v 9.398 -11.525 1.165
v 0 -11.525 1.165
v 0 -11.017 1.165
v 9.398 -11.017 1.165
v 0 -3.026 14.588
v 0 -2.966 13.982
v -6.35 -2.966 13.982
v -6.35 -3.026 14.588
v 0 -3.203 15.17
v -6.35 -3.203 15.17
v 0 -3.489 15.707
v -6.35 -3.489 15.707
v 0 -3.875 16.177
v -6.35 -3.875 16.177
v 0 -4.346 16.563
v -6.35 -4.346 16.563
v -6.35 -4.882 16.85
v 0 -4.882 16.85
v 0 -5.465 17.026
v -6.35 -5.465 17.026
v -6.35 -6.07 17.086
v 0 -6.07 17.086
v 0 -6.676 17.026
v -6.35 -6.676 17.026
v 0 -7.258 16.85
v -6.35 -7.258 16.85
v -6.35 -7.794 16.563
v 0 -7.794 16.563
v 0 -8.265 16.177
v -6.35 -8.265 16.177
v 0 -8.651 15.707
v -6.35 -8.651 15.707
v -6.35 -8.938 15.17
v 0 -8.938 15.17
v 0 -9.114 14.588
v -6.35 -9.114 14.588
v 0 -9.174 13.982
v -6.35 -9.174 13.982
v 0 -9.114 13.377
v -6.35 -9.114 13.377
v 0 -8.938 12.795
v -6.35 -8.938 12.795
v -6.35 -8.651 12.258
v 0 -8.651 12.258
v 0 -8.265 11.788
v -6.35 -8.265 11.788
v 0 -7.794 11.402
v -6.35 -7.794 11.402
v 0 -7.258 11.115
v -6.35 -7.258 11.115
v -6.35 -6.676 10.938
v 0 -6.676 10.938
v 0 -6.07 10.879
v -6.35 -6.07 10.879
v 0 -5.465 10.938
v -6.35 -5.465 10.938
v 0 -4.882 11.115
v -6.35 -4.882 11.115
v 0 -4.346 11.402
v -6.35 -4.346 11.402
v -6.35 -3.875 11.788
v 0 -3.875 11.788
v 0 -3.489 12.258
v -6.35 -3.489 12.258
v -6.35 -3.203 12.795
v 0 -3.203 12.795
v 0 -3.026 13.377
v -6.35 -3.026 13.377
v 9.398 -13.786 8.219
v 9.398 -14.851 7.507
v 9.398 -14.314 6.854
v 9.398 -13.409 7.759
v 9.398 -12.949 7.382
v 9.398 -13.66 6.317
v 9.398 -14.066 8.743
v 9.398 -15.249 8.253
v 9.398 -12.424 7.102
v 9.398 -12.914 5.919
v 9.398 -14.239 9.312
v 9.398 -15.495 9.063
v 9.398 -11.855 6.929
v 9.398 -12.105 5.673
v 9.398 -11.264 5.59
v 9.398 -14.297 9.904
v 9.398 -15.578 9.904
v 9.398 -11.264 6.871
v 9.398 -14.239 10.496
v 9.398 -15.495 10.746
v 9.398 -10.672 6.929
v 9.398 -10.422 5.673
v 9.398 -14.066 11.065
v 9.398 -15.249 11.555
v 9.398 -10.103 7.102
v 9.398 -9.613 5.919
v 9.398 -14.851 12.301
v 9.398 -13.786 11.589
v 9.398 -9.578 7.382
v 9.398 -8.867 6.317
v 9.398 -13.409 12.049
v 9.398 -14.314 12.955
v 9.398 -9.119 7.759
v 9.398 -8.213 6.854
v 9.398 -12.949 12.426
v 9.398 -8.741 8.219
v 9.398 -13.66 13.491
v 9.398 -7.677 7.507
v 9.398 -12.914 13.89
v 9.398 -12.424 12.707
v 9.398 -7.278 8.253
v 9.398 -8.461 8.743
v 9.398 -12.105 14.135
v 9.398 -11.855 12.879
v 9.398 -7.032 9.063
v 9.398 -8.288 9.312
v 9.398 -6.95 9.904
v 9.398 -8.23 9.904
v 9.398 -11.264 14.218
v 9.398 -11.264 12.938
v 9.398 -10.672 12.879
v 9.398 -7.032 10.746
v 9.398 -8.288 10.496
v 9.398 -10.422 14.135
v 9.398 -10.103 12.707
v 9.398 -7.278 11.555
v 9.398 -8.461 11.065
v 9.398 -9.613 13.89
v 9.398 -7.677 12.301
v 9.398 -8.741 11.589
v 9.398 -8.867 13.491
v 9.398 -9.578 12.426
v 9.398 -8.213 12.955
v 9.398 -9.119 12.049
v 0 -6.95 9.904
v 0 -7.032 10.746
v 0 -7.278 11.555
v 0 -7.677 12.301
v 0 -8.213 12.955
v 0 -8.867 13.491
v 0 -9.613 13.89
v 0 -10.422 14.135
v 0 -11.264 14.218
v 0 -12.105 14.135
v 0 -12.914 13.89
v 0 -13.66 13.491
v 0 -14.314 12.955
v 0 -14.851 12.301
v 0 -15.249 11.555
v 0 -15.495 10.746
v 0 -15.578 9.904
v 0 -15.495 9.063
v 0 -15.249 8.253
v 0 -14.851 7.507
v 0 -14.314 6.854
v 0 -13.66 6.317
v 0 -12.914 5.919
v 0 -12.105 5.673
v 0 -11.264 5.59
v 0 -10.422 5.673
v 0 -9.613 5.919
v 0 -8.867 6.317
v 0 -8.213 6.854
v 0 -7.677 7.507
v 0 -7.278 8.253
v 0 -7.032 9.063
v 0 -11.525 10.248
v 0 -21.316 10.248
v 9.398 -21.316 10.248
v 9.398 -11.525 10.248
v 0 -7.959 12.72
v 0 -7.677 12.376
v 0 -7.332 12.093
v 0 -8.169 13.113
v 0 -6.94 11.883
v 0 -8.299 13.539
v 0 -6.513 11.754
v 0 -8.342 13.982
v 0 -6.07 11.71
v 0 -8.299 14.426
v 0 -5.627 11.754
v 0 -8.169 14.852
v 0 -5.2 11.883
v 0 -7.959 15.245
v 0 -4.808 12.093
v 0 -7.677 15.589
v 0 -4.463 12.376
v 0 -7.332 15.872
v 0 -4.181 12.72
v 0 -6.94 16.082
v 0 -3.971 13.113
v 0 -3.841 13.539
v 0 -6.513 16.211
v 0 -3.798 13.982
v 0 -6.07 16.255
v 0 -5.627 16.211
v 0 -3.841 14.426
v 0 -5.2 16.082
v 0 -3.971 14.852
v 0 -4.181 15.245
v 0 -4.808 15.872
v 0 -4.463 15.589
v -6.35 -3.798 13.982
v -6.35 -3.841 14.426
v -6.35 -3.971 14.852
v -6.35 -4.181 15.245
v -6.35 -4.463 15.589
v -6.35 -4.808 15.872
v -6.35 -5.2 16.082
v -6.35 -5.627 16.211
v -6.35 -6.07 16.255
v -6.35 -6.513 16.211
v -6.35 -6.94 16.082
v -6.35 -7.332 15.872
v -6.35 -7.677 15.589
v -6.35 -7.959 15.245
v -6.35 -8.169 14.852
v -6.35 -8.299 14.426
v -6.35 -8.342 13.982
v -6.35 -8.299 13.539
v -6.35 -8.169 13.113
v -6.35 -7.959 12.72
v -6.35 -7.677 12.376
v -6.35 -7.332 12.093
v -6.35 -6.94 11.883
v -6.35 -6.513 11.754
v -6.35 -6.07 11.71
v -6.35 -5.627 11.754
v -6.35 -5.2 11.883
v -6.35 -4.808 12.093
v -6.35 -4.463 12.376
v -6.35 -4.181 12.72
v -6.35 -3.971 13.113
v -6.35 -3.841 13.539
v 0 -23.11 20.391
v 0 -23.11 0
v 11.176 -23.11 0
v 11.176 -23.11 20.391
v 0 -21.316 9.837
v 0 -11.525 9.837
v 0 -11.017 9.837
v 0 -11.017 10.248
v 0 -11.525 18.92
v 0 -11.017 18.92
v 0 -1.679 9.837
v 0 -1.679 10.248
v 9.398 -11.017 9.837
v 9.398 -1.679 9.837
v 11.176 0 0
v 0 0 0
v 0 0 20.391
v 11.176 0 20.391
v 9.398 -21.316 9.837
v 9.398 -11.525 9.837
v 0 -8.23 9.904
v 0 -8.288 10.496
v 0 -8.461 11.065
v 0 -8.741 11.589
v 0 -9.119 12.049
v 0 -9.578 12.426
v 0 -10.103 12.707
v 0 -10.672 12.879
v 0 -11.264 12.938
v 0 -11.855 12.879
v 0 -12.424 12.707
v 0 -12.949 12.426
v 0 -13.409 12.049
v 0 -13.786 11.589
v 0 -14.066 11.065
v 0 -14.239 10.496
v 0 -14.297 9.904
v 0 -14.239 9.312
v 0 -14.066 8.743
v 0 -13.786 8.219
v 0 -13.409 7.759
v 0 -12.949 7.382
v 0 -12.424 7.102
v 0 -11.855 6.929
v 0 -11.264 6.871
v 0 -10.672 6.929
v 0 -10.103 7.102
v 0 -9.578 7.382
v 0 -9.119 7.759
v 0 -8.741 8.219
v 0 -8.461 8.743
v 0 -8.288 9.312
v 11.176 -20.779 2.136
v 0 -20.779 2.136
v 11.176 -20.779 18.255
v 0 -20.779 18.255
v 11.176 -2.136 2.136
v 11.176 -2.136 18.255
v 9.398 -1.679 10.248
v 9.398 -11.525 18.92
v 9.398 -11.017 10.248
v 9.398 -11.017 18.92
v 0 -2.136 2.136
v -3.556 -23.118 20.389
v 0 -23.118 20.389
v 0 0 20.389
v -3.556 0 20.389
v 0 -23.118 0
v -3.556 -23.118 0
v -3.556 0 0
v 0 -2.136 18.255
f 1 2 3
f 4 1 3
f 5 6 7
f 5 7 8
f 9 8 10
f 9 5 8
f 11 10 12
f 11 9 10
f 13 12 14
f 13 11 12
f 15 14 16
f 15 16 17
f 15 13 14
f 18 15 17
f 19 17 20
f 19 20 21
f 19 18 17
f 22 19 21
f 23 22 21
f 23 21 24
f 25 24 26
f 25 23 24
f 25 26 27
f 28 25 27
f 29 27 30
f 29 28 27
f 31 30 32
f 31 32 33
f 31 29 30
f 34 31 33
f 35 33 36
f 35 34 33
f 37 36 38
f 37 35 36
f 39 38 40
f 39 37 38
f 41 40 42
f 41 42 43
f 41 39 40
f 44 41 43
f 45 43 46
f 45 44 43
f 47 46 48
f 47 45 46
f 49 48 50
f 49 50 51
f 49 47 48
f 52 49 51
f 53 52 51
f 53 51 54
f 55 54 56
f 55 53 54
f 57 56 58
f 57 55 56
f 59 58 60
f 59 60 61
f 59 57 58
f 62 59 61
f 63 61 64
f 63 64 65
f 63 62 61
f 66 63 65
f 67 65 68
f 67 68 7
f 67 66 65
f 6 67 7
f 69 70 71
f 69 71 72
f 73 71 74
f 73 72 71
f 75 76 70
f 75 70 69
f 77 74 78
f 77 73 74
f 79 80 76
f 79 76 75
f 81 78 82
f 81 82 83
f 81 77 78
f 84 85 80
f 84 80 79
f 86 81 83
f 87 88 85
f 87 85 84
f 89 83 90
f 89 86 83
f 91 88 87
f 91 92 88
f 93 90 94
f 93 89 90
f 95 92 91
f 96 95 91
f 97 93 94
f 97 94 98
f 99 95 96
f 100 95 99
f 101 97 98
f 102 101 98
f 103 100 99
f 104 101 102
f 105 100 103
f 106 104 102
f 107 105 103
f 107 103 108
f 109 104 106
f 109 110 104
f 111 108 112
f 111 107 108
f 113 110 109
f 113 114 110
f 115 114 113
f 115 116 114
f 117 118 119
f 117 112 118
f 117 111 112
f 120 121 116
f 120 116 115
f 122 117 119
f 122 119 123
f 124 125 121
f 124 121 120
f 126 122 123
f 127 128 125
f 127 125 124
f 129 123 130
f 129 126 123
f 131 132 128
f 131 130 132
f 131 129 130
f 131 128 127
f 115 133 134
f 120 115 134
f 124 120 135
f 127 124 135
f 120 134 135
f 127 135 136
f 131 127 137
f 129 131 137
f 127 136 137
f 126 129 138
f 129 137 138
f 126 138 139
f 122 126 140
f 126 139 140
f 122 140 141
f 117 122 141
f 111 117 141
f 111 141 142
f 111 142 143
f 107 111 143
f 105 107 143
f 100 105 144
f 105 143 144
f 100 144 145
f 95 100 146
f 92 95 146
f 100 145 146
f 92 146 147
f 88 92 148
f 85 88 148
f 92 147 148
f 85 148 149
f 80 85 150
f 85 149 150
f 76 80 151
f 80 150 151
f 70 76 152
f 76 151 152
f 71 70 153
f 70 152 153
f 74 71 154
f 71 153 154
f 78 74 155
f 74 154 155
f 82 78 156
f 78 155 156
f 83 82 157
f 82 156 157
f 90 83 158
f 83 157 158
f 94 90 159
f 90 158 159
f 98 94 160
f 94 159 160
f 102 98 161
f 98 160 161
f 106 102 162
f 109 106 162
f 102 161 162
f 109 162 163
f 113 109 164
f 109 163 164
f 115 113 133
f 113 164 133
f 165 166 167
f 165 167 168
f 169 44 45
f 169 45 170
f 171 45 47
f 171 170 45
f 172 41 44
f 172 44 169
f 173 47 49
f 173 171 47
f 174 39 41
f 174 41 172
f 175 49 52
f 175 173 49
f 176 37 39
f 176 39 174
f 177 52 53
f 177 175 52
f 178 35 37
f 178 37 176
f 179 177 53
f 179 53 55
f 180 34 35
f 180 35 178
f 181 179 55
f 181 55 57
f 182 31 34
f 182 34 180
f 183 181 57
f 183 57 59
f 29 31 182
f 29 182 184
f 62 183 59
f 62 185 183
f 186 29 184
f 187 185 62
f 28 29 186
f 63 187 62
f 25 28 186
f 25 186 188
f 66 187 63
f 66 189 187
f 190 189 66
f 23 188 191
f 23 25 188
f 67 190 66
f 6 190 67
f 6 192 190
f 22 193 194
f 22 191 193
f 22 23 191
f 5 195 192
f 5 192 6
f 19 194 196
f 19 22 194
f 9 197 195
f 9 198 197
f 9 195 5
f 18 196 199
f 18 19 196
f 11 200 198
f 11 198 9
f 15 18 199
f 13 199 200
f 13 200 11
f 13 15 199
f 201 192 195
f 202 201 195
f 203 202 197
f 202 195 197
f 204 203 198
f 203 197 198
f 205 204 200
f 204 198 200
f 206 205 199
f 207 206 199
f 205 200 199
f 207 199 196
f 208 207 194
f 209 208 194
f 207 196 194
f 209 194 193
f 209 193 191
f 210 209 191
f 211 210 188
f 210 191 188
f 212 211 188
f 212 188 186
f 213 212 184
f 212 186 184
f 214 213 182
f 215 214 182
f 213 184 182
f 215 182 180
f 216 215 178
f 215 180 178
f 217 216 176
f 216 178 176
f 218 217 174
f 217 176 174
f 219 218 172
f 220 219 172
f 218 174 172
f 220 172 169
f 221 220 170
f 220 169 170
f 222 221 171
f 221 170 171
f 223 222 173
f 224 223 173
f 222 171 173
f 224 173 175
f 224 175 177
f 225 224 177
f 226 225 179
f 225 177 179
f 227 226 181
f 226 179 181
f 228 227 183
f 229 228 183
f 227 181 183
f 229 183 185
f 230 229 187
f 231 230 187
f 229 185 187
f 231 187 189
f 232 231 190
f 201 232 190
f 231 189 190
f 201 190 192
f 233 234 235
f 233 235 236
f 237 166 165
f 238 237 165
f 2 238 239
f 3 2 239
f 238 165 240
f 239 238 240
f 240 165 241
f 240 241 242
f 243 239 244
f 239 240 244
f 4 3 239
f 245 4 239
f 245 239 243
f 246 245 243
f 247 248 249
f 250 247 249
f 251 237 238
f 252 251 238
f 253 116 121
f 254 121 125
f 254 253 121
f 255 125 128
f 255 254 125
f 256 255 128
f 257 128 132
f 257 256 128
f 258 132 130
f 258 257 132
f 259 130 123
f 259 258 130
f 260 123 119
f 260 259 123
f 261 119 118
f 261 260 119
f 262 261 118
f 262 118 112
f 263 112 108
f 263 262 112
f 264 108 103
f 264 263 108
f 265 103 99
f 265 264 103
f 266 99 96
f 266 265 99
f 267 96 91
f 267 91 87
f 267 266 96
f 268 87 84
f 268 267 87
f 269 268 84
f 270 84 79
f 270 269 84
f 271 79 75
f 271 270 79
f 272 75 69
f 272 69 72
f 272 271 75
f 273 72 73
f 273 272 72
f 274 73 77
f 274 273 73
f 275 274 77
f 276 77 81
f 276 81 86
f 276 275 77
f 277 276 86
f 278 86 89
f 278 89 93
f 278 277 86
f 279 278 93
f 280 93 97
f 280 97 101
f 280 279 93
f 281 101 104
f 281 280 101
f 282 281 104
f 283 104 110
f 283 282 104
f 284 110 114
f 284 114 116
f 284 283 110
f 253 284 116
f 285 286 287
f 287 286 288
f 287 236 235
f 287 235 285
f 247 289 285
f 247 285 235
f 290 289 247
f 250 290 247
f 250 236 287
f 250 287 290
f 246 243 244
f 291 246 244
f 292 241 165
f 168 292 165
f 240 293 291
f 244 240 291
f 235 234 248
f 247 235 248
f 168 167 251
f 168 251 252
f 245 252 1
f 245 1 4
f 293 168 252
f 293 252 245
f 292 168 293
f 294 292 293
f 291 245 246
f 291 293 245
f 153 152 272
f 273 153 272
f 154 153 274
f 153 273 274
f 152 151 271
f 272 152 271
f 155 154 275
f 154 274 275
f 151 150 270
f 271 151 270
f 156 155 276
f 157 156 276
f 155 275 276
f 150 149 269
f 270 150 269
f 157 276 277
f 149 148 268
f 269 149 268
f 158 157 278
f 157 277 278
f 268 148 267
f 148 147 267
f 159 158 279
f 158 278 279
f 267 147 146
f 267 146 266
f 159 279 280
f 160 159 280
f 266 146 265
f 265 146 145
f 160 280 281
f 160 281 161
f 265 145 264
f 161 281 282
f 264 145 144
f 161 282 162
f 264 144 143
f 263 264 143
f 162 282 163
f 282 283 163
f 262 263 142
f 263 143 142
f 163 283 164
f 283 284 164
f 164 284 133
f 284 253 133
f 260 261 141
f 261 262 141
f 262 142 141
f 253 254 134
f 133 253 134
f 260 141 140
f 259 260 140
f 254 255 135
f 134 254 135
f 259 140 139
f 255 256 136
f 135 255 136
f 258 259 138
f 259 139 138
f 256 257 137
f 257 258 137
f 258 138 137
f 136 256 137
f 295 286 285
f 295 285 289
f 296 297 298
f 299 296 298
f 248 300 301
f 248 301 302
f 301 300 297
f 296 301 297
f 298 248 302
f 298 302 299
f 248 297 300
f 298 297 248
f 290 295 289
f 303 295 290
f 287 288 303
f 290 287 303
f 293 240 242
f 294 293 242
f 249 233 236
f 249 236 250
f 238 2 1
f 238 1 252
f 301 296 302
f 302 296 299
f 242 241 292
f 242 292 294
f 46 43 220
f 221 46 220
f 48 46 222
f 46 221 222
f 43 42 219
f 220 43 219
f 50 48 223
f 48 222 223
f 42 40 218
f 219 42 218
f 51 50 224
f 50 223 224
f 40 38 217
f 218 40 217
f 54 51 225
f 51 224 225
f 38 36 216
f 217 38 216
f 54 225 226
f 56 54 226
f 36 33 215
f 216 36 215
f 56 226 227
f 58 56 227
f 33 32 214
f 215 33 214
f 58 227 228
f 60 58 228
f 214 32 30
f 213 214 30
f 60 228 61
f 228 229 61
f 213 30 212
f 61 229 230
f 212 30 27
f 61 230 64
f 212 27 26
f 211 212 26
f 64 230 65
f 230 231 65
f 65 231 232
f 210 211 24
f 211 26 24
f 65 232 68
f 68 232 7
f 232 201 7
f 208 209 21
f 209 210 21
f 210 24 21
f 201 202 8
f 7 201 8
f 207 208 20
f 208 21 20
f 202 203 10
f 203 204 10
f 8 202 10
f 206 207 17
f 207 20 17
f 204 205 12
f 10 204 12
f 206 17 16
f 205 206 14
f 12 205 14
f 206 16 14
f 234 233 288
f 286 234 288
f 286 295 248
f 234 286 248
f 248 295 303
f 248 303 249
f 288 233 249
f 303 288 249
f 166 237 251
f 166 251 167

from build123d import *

# Parameters (mm, degrees)
F0_W     = 23.1096856296
F0_H     = 20.3908998519
F0_W_2   = 18.6431074981
F0_H_2   = 16.118519241
F1_DEPTH = 11.176
F2_R     = 4.3140056634
F2_R_2   = 3.0334859744
F3_DEPTH = 9.398
F4_W     = 0.5085384473
F4_H     = 8.6713107303
F4_W_2   = 9.3377223238
F4_H_2   = 0.411956571
F4_W_3   = 9.7904205322
F4_H_3   = 8.671309799
F5_DEPTH = 9.398
F6_W     = 23.1184829026
F6_H     = 20.3894022852
F7_DEPTH = 3.556
F8_R     = 3.1037983992
F8_R_2   = 2.2723247732
F9_DEPTH = 6.35


with BuildPart() as f1:
    # F0 (on Right) → F1 (new body)
    with BuildSketch(Plane.YZ):
        with Locations((-11.5548428148, 10.195449926)):
            Rectangle(F0_W, F0_H)
        with Locations((-11.4577430068, 10.1954488782)):
            Rectangle(F0_W_2, F0_H_2, mode=Mode.SUBTRACT)
    extrude(amount=F1_DEPTH)


with BuildPart() as f3:
    # F2 (on Right) → F3 (new body)
    with BuildSketch(Plane.YZ):
        with Locations((-11.2635437399, 9.9041499197)):
            Circle(F2_R)
        with Locations((-11.2635437399, 9.9041499197)):
            Circle(F2_R_2, mode=Mode.SUBTRACT)
    extrude(amount=F3_DEPTH)


with BuildPart() as f5:
    # F4 (on Right) → F5 (new body)
    with BuildSketch(Plane.YZ):
        with Locations((-11.2711233087, 14.5841143094)):
            Rectangle(F4_W, F4_H)
        with Locations((-6.3479929231, 10.0424806587)):
            Rectangle(F4_W_2, F4_H_2)
        with Locations((-11.2711233087, 10.0424806587)):
            Rectangle(F4_W, F4_H_2)
        with Locations((-16.4206027985, 10.0424806587)):
            Rectangle(F4_W_3, F4_H_2)
        with Locations((-11.2711233087, 5.5008474737)):
            Rectangle(F4_W, F4_H_3)
    extrude(amount=F5_DEPTH)


with BuildPart() as f7:
    # F6 (on Right) → F7 (new body)
    with BuildSketch(Plane.YZ):
        with Locations((-11.5592414513, 10.1947011426)):
            Rectangle(F6_W, F6_H)
    extrude(amount=-F7_DEPTH)


with BuildPart() as f9:
    # F8 (on Right) → F9 (new body)
    with BuildSketch(Plane.YZ):
        with Locations((-6.07004622, 13.982298784)):
            Circle(F8_R)
        with Locations((-6.07004622, 13.982298784)):
            Circle(F8_R_2, mode=Mode.SUBTRACT)
    extrude(amount=-F9_DEPTH)


solid = Compound([f1.part, f3.part, f5.part, f7.part, f9.part])
